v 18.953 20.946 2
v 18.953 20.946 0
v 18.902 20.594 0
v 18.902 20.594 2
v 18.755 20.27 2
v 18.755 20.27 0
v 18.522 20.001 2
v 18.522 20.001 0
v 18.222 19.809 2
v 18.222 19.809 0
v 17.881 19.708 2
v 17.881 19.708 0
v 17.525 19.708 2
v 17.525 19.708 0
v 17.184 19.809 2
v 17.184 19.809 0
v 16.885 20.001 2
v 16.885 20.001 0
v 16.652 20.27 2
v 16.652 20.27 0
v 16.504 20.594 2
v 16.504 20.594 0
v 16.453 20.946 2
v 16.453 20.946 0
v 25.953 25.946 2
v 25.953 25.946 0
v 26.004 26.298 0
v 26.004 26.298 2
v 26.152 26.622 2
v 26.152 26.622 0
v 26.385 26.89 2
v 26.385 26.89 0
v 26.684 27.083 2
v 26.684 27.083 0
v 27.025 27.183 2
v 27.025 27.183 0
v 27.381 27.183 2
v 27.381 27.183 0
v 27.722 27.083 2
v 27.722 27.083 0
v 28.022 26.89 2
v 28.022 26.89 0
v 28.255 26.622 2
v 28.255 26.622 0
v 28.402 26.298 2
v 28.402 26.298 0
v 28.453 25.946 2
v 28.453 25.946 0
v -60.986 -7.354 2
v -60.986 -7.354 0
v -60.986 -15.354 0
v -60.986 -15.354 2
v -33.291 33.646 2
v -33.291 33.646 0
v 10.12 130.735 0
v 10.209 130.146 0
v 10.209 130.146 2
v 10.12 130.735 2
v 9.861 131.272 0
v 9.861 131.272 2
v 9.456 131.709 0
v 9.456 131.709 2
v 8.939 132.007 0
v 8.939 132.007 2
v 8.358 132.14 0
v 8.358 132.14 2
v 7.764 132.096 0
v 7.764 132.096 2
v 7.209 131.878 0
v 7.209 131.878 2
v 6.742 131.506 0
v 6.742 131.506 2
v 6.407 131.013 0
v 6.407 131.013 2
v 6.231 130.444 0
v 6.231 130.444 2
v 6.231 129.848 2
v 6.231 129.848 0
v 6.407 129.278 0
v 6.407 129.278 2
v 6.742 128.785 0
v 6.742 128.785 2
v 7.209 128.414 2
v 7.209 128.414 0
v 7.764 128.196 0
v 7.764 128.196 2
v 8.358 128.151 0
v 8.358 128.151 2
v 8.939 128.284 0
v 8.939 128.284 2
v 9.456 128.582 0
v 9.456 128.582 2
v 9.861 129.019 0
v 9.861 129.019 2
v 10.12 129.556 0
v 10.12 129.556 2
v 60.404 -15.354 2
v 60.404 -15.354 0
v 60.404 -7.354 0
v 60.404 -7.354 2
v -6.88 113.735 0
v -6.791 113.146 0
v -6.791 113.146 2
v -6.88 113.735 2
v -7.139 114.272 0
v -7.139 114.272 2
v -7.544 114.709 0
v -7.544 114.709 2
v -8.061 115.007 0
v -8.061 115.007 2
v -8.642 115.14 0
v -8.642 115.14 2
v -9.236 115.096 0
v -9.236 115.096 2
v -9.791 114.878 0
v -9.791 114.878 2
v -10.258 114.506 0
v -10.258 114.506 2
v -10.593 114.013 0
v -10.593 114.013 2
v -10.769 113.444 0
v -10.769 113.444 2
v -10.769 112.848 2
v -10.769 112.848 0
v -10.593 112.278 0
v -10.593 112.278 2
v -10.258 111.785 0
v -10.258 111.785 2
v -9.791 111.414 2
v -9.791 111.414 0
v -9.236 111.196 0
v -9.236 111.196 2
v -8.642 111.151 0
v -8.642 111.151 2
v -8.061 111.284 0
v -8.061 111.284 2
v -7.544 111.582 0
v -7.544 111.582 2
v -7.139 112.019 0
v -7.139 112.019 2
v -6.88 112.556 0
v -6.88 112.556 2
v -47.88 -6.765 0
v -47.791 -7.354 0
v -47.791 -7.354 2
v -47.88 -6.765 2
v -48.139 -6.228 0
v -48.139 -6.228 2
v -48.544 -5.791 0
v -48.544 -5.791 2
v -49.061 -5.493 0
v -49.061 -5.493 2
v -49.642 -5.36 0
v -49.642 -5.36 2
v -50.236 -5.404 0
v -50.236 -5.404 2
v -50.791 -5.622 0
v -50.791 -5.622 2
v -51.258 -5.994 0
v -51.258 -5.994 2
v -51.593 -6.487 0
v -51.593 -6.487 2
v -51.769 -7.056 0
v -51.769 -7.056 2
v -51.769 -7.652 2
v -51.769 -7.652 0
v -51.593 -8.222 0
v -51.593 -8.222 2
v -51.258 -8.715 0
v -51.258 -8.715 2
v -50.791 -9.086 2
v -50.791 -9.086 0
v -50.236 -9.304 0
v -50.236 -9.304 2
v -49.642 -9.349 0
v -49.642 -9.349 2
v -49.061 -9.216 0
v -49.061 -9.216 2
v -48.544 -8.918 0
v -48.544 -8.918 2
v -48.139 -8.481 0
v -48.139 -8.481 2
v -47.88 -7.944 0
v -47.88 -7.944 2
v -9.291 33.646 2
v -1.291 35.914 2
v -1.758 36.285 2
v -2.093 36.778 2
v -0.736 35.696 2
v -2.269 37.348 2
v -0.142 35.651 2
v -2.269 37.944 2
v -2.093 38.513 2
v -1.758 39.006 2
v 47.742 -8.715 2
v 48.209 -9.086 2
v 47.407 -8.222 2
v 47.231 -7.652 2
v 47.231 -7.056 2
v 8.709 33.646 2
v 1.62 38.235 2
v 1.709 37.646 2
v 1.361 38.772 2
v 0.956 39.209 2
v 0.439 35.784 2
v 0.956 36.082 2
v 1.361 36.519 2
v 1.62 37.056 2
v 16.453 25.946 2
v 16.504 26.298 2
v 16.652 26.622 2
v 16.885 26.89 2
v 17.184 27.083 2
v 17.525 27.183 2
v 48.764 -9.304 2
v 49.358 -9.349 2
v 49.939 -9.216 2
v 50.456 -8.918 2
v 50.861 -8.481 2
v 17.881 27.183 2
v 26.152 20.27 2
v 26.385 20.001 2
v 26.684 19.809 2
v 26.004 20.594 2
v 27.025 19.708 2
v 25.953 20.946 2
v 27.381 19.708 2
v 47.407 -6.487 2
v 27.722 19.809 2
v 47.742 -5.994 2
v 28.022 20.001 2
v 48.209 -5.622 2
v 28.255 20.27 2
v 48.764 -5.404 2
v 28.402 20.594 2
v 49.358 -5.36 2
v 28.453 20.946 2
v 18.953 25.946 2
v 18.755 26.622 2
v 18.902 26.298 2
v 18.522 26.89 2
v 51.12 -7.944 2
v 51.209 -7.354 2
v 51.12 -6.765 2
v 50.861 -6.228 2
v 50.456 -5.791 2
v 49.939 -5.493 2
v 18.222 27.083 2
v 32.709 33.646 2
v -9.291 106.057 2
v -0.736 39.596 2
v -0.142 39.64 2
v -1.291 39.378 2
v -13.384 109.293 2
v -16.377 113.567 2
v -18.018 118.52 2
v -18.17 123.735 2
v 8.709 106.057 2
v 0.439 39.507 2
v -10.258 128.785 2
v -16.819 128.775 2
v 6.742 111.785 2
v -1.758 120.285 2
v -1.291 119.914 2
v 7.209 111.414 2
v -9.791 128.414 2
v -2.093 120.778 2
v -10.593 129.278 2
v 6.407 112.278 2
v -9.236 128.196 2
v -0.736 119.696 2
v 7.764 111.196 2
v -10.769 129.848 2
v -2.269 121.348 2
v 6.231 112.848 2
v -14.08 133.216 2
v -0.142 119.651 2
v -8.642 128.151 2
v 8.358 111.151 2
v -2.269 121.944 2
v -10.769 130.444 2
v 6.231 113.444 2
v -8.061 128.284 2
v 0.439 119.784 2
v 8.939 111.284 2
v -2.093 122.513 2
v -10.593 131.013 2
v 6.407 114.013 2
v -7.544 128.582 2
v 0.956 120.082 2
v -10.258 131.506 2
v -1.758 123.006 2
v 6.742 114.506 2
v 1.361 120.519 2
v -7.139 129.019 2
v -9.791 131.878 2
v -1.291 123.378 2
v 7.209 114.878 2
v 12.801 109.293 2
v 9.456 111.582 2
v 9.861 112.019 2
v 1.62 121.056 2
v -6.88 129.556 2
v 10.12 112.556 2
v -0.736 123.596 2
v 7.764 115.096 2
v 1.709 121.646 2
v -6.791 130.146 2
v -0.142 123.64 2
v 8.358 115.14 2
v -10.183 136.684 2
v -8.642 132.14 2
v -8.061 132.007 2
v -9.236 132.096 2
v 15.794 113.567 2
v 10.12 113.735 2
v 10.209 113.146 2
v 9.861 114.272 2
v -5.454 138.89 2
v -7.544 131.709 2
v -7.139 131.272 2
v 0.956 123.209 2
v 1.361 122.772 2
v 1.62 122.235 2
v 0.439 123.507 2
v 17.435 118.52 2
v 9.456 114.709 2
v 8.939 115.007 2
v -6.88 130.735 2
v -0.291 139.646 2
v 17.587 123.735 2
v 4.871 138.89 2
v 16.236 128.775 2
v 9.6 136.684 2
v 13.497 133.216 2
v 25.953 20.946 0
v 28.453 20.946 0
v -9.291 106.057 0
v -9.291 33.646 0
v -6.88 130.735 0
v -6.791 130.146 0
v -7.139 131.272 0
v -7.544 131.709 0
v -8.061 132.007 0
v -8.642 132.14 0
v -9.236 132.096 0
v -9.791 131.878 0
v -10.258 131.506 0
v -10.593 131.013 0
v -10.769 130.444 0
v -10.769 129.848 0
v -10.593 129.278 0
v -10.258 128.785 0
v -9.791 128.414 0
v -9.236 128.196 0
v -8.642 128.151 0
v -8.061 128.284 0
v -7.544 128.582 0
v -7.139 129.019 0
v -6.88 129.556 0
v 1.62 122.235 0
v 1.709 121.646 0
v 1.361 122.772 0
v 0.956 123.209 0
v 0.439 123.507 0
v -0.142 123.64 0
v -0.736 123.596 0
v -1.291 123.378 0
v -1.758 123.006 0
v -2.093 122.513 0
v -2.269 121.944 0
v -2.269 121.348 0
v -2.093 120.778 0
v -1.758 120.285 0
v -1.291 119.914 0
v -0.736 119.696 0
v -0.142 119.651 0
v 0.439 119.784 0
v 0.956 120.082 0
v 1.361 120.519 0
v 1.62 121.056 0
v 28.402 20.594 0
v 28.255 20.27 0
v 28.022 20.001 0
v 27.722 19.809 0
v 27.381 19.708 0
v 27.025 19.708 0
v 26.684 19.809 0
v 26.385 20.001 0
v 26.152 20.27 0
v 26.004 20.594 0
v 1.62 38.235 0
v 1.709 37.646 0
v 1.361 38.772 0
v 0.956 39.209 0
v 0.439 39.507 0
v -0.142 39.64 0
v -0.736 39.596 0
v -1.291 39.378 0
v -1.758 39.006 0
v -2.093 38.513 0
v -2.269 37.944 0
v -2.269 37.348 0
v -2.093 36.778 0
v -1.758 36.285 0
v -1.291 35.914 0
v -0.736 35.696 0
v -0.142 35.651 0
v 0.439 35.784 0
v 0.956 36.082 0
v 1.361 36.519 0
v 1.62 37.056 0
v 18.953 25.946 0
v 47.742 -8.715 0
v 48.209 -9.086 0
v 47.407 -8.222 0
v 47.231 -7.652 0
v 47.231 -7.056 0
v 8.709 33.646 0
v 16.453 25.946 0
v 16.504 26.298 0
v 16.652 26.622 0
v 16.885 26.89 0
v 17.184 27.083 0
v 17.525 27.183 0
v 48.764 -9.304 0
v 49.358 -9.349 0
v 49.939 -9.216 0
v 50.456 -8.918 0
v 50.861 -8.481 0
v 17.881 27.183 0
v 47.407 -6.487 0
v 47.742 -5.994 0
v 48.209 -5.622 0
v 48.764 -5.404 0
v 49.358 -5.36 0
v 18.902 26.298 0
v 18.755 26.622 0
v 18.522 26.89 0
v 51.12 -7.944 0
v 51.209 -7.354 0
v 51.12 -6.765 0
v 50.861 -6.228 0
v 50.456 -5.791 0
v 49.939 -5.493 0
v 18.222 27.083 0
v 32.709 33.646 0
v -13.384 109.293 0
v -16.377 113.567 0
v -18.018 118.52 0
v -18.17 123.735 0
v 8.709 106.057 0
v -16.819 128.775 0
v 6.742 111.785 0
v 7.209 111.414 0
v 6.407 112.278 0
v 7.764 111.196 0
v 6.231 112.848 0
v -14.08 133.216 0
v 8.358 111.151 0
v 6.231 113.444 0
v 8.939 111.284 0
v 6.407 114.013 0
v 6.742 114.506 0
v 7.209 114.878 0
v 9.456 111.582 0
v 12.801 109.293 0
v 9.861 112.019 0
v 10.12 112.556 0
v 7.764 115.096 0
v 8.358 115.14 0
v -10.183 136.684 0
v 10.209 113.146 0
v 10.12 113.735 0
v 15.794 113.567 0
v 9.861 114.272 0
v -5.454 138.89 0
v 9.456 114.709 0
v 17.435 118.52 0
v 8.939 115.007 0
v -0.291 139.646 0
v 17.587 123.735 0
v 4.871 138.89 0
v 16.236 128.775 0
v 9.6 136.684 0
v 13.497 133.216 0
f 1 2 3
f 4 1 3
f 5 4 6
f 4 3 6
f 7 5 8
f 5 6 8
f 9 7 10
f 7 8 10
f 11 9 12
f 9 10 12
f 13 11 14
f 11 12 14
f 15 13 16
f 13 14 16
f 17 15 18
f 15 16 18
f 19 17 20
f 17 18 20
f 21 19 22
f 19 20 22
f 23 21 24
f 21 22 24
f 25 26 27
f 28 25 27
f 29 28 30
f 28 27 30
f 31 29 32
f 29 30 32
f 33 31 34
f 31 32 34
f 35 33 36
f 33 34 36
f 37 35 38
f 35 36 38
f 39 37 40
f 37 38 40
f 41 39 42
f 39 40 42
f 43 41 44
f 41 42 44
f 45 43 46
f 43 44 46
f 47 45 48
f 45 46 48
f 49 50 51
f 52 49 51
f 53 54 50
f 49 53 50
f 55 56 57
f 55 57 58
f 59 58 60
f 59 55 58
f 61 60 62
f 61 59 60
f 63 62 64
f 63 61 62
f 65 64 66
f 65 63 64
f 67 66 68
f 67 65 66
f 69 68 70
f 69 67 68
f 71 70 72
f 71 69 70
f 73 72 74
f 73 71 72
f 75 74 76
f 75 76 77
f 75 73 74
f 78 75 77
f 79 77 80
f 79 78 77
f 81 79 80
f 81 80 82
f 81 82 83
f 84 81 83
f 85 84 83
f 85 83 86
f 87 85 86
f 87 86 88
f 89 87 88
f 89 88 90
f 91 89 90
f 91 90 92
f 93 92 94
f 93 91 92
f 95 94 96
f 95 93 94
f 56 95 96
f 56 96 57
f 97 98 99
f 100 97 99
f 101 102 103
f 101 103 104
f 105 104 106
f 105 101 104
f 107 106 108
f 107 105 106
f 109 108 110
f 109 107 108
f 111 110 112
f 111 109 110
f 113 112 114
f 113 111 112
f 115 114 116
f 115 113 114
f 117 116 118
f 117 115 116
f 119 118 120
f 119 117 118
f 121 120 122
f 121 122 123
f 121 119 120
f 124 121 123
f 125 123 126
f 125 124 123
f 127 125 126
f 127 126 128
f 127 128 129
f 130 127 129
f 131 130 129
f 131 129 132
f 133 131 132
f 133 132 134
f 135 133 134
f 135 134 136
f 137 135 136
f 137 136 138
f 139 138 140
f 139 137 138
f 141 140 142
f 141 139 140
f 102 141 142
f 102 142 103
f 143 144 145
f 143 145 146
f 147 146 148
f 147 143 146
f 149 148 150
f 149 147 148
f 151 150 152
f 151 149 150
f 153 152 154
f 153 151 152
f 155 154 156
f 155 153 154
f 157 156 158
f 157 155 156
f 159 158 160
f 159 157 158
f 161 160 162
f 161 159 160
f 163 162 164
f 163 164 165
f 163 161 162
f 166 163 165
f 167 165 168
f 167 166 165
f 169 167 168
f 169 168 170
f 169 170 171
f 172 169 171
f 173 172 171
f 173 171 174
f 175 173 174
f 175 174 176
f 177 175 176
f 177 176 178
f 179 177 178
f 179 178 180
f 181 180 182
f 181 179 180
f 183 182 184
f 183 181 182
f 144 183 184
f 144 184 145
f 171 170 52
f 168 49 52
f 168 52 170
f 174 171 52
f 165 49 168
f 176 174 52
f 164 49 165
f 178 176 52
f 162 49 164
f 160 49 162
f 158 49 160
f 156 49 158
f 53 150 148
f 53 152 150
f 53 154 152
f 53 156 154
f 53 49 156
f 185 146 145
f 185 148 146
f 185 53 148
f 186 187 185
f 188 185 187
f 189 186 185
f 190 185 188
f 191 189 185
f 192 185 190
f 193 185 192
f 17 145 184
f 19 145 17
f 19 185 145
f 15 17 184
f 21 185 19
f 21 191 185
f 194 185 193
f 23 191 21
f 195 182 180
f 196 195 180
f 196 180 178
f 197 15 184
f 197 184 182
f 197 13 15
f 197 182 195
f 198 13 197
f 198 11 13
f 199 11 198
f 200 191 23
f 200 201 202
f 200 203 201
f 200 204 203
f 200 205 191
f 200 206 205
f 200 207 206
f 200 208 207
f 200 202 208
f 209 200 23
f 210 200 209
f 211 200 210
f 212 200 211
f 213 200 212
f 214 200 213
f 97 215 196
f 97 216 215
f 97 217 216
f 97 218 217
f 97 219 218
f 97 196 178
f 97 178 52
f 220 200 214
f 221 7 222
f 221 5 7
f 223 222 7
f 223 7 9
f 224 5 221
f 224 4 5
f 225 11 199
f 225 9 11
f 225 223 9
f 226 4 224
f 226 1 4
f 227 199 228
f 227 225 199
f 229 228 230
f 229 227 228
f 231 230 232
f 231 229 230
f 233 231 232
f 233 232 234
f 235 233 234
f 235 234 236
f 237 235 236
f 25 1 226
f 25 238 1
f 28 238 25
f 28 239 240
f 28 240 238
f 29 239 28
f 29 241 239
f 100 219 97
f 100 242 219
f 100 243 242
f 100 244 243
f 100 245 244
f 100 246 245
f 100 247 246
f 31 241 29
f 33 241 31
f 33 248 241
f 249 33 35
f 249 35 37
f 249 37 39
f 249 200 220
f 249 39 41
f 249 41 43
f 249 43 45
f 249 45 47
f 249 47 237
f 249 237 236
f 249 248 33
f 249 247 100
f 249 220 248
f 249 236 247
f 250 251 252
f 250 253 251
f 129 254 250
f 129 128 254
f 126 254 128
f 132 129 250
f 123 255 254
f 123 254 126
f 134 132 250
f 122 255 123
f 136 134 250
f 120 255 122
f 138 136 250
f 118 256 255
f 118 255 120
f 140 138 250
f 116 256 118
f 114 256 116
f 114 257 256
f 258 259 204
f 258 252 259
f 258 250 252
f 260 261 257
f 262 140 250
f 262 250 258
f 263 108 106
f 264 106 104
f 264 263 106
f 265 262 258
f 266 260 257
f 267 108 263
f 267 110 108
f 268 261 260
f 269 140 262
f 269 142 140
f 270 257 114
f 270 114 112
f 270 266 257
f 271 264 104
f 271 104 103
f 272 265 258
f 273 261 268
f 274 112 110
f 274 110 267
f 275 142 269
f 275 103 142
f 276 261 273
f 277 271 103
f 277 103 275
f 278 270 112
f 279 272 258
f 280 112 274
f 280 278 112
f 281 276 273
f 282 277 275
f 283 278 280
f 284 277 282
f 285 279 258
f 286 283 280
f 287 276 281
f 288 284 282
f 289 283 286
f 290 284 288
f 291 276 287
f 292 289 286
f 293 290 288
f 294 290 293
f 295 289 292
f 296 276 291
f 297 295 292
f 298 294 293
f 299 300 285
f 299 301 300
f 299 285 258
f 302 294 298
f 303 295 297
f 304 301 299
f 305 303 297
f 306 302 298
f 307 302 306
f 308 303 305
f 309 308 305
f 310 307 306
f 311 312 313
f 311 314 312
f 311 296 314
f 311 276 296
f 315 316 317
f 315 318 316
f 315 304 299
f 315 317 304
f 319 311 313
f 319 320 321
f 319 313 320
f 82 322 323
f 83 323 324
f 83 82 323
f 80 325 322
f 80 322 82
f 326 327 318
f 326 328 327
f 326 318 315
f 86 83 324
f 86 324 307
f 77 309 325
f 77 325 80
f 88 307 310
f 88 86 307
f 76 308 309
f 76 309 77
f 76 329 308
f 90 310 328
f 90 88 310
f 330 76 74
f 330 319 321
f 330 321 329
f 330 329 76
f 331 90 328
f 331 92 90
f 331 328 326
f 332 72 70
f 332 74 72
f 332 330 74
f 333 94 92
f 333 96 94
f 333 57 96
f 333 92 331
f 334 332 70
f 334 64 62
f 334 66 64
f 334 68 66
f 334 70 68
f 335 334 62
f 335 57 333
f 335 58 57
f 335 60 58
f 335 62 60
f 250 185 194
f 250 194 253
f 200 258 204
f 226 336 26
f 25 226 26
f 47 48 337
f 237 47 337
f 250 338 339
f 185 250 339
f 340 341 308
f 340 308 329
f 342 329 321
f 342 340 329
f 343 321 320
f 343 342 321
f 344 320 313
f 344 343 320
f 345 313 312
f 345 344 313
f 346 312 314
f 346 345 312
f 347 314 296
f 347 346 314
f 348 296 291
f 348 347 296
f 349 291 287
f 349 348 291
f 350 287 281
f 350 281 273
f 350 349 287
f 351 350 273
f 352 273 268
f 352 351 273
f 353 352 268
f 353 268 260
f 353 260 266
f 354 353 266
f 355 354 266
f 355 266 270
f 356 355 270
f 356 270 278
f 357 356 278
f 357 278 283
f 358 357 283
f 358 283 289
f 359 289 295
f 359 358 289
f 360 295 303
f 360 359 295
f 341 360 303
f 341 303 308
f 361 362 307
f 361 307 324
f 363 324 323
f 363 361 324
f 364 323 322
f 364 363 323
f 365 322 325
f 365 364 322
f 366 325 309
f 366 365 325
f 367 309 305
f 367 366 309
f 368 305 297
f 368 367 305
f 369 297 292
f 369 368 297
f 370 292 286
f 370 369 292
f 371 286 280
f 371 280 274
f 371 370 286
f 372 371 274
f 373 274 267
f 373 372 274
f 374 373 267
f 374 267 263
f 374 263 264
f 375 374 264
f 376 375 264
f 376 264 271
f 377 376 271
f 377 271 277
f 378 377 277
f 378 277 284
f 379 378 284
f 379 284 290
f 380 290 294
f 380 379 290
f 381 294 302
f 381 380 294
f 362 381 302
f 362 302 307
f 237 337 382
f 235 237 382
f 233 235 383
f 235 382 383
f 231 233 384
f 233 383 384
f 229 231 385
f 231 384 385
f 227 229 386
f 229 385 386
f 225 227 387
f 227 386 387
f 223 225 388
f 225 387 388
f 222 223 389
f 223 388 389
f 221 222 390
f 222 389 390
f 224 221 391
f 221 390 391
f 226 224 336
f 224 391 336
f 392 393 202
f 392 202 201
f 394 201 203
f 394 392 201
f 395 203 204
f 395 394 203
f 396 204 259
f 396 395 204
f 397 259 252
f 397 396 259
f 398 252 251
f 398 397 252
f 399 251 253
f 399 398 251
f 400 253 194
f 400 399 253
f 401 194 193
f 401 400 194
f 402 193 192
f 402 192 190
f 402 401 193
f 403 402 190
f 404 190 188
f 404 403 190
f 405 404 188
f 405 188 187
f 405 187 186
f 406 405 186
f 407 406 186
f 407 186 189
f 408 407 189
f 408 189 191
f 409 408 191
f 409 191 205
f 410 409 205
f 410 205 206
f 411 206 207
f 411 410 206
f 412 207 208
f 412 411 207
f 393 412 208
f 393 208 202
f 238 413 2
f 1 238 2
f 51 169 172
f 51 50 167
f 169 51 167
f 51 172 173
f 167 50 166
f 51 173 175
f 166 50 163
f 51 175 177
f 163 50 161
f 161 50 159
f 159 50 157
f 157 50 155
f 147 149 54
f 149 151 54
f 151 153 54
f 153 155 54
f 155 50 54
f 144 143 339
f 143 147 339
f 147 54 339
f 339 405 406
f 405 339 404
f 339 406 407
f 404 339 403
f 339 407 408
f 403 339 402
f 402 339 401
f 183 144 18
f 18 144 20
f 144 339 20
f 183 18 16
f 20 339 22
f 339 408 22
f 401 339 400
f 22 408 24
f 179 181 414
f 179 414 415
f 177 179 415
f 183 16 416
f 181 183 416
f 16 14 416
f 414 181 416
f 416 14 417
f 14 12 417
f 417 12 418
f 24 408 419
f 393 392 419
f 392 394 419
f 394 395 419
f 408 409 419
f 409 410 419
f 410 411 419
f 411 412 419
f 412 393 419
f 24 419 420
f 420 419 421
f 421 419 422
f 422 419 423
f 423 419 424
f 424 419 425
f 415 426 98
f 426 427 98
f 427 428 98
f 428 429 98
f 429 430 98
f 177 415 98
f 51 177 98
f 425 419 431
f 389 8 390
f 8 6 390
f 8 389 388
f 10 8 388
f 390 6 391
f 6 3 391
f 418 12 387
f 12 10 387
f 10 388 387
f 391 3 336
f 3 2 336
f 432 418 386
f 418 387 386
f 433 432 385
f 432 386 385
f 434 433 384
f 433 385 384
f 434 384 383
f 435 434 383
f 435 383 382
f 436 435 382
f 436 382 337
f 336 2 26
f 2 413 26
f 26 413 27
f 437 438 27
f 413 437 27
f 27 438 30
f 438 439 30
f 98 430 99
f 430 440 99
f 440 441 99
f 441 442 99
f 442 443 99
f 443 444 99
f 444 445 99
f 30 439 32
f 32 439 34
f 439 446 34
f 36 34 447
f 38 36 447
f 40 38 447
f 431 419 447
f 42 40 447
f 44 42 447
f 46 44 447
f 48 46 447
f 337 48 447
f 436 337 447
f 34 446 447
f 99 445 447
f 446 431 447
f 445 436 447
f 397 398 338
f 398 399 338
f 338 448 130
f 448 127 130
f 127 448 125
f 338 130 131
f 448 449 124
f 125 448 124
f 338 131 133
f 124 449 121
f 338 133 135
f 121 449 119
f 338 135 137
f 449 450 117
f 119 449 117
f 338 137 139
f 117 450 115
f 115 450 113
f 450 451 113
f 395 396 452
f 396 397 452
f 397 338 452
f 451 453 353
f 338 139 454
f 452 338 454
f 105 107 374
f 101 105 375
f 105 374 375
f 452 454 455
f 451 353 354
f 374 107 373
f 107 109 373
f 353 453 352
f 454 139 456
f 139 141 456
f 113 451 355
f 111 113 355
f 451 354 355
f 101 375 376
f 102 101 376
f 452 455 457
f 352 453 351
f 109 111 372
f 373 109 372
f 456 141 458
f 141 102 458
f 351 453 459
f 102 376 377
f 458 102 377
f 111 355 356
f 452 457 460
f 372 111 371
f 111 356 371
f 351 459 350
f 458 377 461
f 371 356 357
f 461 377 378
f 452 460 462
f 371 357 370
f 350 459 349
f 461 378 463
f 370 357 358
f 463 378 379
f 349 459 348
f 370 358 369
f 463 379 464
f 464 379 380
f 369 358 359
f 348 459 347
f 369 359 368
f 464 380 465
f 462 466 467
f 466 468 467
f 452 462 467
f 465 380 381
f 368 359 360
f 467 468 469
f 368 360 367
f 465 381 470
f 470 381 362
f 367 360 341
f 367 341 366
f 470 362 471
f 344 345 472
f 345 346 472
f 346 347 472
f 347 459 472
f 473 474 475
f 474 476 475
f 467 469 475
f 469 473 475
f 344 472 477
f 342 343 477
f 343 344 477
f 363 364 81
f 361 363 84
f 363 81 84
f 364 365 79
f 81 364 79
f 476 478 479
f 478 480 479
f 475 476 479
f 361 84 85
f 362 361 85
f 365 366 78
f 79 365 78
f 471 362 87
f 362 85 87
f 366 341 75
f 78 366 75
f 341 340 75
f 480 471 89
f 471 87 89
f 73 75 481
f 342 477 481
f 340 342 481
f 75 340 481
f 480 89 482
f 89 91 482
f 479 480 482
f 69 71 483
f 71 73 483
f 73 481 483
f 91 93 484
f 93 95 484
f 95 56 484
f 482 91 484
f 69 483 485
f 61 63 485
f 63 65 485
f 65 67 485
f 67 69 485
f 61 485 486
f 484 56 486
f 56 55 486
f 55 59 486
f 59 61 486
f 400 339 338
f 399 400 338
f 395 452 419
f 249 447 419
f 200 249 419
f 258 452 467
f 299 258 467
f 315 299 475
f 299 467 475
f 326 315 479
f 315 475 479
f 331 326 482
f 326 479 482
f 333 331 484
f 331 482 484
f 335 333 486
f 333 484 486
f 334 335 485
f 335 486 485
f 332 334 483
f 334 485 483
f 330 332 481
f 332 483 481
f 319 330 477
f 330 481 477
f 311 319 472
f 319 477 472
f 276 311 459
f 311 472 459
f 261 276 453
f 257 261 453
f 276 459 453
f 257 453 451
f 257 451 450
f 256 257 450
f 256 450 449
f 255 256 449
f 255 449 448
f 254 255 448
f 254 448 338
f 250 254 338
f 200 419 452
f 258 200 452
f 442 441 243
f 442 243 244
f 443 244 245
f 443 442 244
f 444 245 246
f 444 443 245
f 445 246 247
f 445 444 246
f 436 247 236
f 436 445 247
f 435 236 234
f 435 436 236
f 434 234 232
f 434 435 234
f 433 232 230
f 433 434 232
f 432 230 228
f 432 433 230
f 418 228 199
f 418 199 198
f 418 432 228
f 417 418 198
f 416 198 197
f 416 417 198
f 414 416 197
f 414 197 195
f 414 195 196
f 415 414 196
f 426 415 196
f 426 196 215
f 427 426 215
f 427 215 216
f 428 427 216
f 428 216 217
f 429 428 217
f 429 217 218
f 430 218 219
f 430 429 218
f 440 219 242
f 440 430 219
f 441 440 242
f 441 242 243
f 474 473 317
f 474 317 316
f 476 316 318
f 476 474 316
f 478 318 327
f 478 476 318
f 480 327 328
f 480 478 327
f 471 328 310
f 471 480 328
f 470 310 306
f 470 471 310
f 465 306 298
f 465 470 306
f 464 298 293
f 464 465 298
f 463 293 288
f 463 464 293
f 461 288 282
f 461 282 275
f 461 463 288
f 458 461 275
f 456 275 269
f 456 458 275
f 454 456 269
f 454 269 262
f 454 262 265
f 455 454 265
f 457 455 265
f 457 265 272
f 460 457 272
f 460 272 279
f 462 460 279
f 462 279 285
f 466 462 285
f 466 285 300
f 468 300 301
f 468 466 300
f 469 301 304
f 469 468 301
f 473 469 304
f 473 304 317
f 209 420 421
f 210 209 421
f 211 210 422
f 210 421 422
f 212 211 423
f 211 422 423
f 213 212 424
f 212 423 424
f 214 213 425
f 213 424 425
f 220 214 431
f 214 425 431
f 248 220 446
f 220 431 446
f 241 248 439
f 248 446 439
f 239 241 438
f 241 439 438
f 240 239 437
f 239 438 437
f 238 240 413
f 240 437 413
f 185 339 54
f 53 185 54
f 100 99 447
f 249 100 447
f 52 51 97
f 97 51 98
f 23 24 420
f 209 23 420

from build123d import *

# Parameters (mm, degrees)
SKETCH_1_R      = 2
EXTRUDE_1_DEPTH = 2


with BuildPart() as part:
    # 草图1 → 凸台-拉伸1 (new body)
    with BuildSketch(Plane.XY):
        with BuildLine():
            Line((-9.291428571, 106.057257018), (-9.291428571, 33.645714286))
            Line((-9.291428571, 33.645714286), (-33.291428571, 33.645714286))
            Line((-33.291428571, 33.645714286), (-60.986481548, -7.354285714))
            Line((-60.986481548, -7.354285714), (-60.986481548, -15.354285714))
            Line((-60.986481548, -15.354285714), (60.403624405, -15.354285714))
            Line((60.403624405, -15.354285714), (60.403624405, -7.354285714))
            Line((60.403624405, -7.354285714), (32.708571429, 33.645714286))
            Line((32.708571429, 33.645714286), (8.708571429, 33.645714286))
            Line((8.708571429, 33.645714286), (8.708571429, 106.057257018))
            ThreePointArc((8.708571429, 106.057257018), (-0.291428571, 139.645714286), (-9.291428571, 106.057257018))
        make_face()
        with Locations((-49.791428571, -7.354285714)):
            Circle(SKETCH_1_R, mode=Mode.SUBTRACT)
        with Locations((-0.291428571, 37.645714286)):
            Circle(SKETCH_1_R, mode=Mode.SUBTRACT)
        with Locations((49.208571429, -7.354285714)):
            Circle(SKETCH_1_R, mode=Mode.SUBTRACT)
        with BuildLine():
            ThreePointArc((16.453130984, 25.945714286), (17.703130984, 27.195714286), (18.953130984, 25.945714286))
            Line((18.953130984, 25.945714286), (18.953130984, 20.945714286))
            ThreePointArc((18.953130984, 20.945714286), (17.703130984, 19.695714286), (16.453130984, 20.945714286))
            Line((16.453130984, 20.945714286), (16.453130984, 25.945714286))
        make_face(mode=Mode.SUBTRACT)
        with BuildLine():
            ThreePointArc((25.953130984, 25.945714286), (27.203130984, 27.195714286), (28.453130984, 25.945714286))
            Line((28.453130984, 25.945714286), (28.453130984, 20.945714286))
            ThreePointArc((28.453130984, 20.945714286), (27.203130984, 19.695714286), (25.953130984, 20.945714286))
            Line((25.953130984, 20.945714286), (25.953130984, 25.945714286))
        make_face(mode=Mode.SUBTRACT)
        with Locations((8.208571429, 130.145714286)):
            Circle(SKETCH_1_R, mode=Mode.SUBTRACT)
        with Locations((-8.791428571, 113.145714286)):
            Circle(SKETCH_1_R, mode=Mode.SUBTRACT)
        with Locations((-0.291428571, 121.645714286)):
            Circle(SKETCH_1_R, mode=Mode.SUBTRACT)
        with Locations((-8.791428571, 130.145714286)):
            Circle(SKETCH_1_R, mode=Mode.SUBTRACT)
        with Locations((8.208571429, 113.145714286)):
            Circle(SKETCH_1_R, mode=Mode.SUBTRACT)
    extrude(amount=EXTRUDE_1_DEPTH)


solid = part.part
